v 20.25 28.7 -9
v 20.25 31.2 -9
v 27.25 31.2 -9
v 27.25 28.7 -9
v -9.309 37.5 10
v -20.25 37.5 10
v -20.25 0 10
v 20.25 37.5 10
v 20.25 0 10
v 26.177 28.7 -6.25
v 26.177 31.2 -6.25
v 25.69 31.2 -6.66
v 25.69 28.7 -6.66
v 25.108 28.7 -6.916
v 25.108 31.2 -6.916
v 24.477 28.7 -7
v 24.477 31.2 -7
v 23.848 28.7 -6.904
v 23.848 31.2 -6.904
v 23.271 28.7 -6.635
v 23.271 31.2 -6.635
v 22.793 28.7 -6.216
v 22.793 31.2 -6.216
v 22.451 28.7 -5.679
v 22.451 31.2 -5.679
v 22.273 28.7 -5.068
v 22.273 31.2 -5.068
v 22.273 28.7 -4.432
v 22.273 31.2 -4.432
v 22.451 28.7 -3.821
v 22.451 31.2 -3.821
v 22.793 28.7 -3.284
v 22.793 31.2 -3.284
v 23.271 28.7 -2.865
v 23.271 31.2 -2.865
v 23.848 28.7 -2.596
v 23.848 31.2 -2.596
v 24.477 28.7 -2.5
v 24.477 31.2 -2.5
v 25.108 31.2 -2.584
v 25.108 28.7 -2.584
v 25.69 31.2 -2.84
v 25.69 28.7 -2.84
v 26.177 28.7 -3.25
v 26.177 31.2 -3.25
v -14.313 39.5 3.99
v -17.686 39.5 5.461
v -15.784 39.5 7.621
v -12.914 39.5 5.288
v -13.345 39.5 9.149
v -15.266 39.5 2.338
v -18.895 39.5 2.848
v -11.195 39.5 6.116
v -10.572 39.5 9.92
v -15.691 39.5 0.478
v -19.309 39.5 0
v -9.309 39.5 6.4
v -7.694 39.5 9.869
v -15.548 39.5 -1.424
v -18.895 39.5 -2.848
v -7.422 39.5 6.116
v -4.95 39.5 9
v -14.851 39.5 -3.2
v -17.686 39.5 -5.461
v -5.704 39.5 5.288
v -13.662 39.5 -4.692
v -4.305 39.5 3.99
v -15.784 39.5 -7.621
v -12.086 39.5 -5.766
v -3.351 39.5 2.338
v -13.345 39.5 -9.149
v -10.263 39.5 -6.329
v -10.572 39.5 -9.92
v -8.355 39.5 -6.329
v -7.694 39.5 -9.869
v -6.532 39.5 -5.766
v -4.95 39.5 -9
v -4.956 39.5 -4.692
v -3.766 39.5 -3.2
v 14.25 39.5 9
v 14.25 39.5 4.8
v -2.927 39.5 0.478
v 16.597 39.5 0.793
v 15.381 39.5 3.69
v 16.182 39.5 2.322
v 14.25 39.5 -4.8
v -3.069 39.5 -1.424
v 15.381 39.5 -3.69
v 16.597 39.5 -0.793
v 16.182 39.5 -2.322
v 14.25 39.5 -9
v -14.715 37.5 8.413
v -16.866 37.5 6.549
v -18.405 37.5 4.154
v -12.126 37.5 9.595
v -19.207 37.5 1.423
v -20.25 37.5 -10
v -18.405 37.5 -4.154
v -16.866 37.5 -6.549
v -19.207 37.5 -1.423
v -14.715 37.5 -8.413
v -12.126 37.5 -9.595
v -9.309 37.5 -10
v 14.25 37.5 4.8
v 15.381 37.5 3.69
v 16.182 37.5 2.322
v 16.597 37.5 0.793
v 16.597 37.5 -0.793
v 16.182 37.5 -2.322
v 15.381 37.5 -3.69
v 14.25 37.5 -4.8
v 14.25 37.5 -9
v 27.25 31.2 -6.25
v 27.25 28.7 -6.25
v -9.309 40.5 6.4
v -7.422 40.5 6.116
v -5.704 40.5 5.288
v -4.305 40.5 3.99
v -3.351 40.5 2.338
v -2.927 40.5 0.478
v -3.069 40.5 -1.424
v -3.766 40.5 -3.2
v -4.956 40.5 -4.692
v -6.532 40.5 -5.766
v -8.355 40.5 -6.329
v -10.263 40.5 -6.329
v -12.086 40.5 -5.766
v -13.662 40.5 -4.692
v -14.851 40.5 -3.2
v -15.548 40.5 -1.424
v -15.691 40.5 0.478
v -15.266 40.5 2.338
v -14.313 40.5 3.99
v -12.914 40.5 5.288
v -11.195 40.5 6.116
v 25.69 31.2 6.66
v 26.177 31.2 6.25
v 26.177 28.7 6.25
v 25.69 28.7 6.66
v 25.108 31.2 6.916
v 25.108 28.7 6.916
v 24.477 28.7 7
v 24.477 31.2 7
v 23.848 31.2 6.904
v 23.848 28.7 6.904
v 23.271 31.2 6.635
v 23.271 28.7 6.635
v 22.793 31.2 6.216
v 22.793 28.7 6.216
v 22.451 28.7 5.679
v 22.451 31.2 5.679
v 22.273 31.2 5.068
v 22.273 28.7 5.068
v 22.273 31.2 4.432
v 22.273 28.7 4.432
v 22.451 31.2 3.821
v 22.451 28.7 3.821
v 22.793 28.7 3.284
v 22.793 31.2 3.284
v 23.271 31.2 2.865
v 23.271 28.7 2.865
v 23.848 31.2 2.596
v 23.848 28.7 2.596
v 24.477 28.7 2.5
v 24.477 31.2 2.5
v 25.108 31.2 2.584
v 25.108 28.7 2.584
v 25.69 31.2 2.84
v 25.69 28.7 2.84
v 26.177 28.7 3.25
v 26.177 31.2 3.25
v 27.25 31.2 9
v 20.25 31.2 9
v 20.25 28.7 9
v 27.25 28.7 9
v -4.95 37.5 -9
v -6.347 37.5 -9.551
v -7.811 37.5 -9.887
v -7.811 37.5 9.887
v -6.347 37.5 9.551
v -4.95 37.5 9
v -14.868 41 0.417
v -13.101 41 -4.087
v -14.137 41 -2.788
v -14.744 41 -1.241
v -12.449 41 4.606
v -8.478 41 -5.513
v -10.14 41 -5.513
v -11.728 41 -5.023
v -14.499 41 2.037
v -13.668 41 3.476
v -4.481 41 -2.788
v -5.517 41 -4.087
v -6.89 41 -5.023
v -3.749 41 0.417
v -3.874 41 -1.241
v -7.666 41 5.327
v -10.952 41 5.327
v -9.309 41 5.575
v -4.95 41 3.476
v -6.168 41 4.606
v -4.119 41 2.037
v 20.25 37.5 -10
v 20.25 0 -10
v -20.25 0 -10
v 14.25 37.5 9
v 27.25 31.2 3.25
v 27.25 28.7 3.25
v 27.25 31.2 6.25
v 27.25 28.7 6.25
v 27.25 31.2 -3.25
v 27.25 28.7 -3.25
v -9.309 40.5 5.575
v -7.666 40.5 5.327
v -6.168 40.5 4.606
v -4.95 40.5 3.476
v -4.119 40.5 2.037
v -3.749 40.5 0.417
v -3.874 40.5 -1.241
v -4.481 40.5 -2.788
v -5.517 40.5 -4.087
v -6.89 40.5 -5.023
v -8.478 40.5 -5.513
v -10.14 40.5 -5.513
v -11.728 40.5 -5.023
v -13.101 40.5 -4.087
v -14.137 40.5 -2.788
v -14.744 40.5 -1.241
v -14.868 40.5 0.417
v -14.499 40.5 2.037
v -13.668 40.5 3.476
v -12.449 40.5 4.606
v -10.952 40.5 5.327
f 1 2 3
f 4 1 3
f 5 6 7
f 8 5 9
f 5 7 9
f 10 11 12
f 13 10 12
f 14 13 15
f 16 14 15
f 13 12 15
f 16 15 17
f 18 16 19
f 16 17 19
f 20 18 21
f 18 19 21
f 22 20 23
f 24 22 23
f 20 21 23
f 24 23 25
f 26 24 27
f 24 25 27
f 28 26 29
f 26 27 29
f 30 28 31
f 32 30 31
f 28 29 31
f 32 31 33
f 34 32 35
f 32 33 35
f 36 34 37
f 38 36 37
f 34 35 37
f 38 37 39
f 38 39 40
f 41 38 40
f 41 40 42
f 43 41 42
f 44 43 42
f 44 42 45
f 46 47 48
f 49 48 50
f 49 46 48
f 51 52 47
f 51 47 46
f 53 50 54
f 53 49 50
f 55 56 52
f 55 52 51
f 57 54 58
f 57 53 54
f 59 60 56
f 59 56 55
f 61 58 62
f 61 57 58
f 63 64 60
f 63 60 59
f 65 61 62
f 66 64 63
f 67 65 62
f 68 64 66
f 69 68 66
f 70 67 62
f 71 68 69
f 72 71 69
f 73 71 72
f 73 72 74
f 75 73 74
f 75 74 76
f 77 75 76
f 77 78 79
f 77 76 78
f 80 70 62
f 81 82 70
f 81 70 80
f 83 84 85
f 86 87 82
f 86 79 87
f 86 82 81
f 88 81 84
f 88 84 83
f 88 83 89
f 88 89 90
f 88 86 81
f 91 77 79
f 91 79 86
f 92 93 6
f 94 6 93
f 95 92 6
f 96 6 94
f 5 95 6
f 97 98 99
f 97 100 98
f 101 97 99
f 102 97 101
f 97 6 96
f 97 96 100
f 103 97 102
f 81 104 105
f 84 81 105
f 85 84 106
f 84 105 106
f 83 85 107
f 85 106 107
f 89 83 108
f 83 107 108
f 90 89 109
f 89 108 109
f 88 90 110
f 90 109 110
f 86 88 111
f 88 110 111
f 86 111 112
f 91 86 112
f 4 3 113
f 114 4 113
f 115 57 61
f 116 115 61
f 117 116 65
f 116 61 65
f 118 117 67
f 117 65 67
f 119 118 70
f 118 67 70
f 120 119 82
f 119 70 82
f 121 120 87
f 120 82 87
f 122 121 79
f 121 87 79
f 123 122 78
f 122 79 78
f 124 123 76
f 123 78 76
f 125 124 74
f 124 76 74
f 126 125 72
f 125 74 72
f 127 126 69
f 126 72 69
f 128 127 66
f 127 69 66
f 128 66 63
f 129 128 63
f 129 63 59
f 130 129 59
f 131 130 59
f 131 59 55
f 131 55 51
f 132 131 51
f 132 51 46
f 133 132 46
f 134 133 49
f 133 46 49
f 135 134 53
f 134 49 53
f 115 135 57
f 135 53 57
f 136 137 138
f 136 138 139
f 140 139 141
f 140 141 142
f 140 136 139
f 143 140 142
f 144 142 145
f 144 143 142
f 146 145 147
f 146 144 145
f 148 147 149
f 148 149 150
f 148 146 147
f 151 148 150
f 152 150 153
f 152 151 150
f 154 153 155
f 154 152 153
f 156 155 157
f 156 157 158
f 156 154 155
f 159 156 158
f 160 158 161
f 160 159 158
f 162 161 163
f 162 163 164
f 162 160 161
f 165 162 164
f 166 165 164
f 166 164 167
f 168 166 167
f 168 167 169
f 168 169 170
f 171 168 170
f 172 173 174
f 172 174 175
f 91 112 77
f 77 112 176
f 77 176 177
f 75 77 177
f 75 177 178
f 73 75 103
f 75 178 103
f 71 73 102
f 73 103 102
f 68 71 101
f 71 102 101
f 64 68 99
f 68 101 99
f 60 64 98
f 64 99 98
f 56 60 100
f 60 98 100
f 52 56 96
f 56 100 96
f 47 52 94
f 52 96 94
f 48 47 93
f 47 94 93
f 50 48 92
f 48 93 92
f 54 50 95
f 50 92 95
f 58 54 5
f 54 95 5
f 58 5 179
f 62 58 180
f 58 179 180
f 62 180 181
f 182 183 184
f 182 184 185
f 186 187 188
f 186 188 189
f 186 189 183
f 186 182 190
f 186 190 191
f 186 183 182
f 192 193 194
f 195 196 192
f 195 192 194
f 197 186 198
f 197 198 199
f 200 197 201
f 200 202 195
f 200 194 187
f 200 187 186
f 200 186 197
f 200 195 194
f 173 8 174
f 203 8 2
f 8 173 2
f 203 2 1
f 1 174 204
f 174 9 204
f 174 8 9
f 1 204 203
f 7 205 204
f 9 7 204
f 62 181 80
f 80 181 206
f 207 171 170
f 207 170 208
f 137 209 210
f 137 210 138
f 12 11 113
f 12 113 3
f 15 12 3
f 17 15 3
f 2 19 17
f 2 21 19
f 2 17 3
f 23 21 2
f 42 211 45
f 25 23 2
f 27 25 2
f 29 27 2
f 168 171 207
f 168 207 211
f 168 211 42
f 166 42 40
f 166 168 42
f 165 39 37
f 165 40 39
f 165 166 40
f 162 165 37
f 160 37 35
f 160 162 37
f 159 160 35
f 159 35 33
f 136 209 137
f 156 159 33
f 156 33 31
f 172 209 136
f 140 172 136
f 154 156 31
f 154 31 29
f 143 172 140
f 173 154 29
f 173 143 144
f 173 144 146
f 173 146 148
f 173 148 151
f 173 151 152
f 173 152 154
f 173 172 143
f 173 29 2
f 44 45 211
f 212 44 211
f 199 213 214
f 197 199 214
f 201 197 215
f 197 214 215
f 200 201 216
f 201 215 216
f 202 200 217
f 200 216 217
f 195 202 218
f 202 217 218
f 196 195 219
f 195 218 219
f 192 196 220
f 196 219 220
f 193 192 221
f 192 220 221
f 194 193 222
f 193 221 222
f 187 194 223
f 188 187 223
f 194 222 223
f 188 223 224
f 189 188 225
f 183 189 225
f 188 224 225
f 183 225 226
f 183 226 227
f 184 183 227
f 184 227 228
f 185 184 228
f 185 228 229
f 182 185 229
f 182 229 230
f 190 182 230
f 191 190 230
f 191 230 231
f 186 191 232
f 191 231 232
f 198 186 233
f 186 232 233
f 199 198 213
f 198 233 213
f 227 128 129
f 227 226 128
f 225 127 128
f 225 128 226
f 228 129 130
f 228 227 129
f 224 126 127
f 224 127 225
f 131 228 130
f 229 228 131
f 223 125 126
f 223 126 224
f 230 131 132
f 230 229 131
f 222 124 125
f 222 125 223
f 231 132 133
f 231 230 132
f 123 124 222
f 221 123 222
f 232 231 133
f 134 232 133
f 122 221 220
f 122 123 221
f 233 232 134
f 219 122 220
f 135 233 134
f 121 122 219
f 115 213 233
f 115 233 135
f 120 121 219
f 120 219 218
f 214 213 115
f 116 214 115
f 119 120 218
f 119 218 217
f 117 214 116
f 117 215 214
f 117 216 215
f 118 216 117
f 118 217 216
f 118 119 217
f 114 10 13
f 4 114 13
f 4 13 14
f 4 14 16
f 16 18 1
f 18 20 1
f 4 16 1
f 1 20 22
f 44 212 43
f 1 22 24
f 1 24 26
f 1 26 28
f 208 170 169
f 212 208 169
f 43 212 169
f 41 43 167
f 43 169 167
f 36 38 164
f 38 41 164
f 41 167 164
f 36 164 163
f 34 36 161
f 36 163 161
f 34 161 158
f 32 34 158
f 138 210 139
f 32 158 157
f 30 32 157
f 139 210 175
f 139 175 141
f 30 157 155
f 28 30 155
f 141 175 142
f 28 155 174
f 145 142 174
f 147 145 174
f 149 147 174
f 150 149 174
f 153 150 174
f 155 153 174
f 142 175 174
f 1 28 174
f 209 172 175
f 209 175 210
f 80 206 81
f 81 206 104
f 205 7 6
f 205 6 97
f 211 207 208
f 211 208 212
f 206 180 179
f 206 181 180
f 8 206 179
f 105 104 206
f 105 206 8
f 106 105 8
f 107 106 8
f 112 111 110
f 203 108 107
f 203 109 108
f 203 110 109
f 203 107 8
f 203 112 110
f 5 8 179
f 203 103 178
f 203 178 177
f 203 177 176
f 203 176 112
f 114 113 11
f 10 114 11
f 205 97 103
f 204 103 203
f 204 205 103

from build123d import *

# Parameters (mm, degrees)
SKETCH1_W            = 40.5
SKETCH1_H            = 20
BOSS_EXTRUDE1_DEPTH  = 37.5
BOSS_EXTRUDE2_DEPTH  = 2
SKETCH3_R            = 6.4
BOSS_EXTRUDE3_DEPTH  = 1
SKETCH4_R            = 5.575
BOSS_EXTRUDE4_DEPTH  = 0.5
BOSS_EXTRUDE5_DEPTH  = 2.5
MIRROR2_COPY_1_DEPTH = 2.5
SKETCH_1_W           = 7
SKETCH_1_H           = 2.5
CUT_EXTRUDE_1_DEPTH  = 53.768953941


with BuildPart() as part:
    # Sketch1 → Boss-Extrude1 (new body)
    with BuildSketch(Plane(origin=(0, 0, 0), x_dir=(1, 0, 0), z_dir=(0, 1, 0))):
        Rectangle(SKETCH1_W, SKETCH1_H)
    extrude(amount=BOSS_EXTRUDE1_DEPTH)

    # Sketch2 → Boss-Extrude2 (add)
    with BuildSketch(Plane(origin=(0, 37.5, 0), x_dir=(1, 0, 0), z_dir=(0, 1, 0))):
        with BuildLine():
            Line((-4.95, -9), (14.25, -9))
            Line((14.25, -9), (14.25, -4.8))
            ThreePointArc((14.25, -4.8), (16.65, 0), (14.25, 4.8))
            Line((14.25, 4.8), (14.25, 9))
            Line((14.25, 9), (-4.95, 9))
            ThreePointArc((-4.95, 9), (-19.308898944, 0), (-4.95, -9))
        make_face()
    extrude(amount=BOSS_EXTRUDE2_DEPTH)

    # Sketch3 → Boss-Extrude3 (add)
    with BuildSketch(Plane(origin=(0, 39.5, 0), x_dir=(1, 0, 0), z_dir=(0, 1, 0))):
        with Locations(Location((-9.308898944, 0, 0), (0, 0, 270))):
            Circle(SKETCH3_R)
    extrude(amount=BOSS_EXTRUDE3_DEPTH)

    # Sketch4 → Boss-Extrude4 (add)
    with BuildSketch(Plane(origin=(0, 40.5, 0), x_dir=(1, 0, 0), z_dir=(0, 1, 0))):
        with Locations(Location((-9.308898944, 0, 0), (0, 0, 270))):
            Circle(SKETCH4_R)
    extrude(amount=BOSS_EXTRUDE4_DEPTH)

    # Sketch5 → Boss-Extrude5 (add)
    with BuildSketch(Plane(origin=(0, 31.2, 0), x_dir=(1, 0, 0), z_dir=(0, 1, 0))):
        with BuildLine():
            Line((20.25, 9), (27.25, 9))
            Line((27.25, 9), (27.25, 6.25))
            Line((27.25, 6.25), (26.177050983, 6.25))
            ThreePointArc((26.177050983, 6.25), (22.25, 4.75), (26.177050983, 3.25))
            Line((26.177050983, 3.25), (27.25, 3.25))
            Line((27.25, 3.25), (27.25, 0))
            Line((27.25, 0), (20.25, 0))
            Line((20.25, 0), (20.25, 9))
        make_face()
    boss_extrude5 = extrude(amount=-BOSS_EXTRUDE5_DEPTH)

    # Mirror1: Boss-Extrude5 across plane
    add(boss_extrude5.mirror(Plane(origin=(0, 0, 0), x_dir=(0, 0, 1), z_dir=(1, 0, 0))))

    # Mirror2: Boss-Extrude5 across plane
    add(boss_extrude5.mirror(Plane.XY))

    # Mirror2 copy 1 sketch → Mirror2 copy 1 (add)
    with BuildSketch(Plane(origin=(0, 31.2, 0), x_dir=(-1, 0, 0), z_dir=(0, 1, 0))):
        with BuildLine():
            Line((20.25, 9), (27.25, 9))
            Line((27.25, 9), (27.25, 6.25))
            Line((27.25, 6.25), (26.177050983, 6.25))
            ThreePointArc((26.177050983, 6.25), (22.25, 4.75), (26.177050983, 3.25))
            Line((26.177050983, 3.25), (27.25, 3.25))
            Line((27.25, 3.25), (27.25, 0))
            Line((27.25, 0), (20.25, 0))
            Line((20.25, 0), (20.25, 9))
        make_face()
    extrude(amount=-MIRROR2_COPY_1_DEPTH)

    # ｽｹｯﾁ1 → ｶｯﾄ - 押し出し1 (cut, through all)
    with BuildSketch(Plane.XY.offset(9)):
        with Locations((-23.75, 29.95)):
            Rectangle(SKETCH_1_W, SKETCH_1_H)
    extrude(amount=-CUT_EXTRUDE_1_DEPTH, mode=Mode.SUBTRACT)


solid = part.part
